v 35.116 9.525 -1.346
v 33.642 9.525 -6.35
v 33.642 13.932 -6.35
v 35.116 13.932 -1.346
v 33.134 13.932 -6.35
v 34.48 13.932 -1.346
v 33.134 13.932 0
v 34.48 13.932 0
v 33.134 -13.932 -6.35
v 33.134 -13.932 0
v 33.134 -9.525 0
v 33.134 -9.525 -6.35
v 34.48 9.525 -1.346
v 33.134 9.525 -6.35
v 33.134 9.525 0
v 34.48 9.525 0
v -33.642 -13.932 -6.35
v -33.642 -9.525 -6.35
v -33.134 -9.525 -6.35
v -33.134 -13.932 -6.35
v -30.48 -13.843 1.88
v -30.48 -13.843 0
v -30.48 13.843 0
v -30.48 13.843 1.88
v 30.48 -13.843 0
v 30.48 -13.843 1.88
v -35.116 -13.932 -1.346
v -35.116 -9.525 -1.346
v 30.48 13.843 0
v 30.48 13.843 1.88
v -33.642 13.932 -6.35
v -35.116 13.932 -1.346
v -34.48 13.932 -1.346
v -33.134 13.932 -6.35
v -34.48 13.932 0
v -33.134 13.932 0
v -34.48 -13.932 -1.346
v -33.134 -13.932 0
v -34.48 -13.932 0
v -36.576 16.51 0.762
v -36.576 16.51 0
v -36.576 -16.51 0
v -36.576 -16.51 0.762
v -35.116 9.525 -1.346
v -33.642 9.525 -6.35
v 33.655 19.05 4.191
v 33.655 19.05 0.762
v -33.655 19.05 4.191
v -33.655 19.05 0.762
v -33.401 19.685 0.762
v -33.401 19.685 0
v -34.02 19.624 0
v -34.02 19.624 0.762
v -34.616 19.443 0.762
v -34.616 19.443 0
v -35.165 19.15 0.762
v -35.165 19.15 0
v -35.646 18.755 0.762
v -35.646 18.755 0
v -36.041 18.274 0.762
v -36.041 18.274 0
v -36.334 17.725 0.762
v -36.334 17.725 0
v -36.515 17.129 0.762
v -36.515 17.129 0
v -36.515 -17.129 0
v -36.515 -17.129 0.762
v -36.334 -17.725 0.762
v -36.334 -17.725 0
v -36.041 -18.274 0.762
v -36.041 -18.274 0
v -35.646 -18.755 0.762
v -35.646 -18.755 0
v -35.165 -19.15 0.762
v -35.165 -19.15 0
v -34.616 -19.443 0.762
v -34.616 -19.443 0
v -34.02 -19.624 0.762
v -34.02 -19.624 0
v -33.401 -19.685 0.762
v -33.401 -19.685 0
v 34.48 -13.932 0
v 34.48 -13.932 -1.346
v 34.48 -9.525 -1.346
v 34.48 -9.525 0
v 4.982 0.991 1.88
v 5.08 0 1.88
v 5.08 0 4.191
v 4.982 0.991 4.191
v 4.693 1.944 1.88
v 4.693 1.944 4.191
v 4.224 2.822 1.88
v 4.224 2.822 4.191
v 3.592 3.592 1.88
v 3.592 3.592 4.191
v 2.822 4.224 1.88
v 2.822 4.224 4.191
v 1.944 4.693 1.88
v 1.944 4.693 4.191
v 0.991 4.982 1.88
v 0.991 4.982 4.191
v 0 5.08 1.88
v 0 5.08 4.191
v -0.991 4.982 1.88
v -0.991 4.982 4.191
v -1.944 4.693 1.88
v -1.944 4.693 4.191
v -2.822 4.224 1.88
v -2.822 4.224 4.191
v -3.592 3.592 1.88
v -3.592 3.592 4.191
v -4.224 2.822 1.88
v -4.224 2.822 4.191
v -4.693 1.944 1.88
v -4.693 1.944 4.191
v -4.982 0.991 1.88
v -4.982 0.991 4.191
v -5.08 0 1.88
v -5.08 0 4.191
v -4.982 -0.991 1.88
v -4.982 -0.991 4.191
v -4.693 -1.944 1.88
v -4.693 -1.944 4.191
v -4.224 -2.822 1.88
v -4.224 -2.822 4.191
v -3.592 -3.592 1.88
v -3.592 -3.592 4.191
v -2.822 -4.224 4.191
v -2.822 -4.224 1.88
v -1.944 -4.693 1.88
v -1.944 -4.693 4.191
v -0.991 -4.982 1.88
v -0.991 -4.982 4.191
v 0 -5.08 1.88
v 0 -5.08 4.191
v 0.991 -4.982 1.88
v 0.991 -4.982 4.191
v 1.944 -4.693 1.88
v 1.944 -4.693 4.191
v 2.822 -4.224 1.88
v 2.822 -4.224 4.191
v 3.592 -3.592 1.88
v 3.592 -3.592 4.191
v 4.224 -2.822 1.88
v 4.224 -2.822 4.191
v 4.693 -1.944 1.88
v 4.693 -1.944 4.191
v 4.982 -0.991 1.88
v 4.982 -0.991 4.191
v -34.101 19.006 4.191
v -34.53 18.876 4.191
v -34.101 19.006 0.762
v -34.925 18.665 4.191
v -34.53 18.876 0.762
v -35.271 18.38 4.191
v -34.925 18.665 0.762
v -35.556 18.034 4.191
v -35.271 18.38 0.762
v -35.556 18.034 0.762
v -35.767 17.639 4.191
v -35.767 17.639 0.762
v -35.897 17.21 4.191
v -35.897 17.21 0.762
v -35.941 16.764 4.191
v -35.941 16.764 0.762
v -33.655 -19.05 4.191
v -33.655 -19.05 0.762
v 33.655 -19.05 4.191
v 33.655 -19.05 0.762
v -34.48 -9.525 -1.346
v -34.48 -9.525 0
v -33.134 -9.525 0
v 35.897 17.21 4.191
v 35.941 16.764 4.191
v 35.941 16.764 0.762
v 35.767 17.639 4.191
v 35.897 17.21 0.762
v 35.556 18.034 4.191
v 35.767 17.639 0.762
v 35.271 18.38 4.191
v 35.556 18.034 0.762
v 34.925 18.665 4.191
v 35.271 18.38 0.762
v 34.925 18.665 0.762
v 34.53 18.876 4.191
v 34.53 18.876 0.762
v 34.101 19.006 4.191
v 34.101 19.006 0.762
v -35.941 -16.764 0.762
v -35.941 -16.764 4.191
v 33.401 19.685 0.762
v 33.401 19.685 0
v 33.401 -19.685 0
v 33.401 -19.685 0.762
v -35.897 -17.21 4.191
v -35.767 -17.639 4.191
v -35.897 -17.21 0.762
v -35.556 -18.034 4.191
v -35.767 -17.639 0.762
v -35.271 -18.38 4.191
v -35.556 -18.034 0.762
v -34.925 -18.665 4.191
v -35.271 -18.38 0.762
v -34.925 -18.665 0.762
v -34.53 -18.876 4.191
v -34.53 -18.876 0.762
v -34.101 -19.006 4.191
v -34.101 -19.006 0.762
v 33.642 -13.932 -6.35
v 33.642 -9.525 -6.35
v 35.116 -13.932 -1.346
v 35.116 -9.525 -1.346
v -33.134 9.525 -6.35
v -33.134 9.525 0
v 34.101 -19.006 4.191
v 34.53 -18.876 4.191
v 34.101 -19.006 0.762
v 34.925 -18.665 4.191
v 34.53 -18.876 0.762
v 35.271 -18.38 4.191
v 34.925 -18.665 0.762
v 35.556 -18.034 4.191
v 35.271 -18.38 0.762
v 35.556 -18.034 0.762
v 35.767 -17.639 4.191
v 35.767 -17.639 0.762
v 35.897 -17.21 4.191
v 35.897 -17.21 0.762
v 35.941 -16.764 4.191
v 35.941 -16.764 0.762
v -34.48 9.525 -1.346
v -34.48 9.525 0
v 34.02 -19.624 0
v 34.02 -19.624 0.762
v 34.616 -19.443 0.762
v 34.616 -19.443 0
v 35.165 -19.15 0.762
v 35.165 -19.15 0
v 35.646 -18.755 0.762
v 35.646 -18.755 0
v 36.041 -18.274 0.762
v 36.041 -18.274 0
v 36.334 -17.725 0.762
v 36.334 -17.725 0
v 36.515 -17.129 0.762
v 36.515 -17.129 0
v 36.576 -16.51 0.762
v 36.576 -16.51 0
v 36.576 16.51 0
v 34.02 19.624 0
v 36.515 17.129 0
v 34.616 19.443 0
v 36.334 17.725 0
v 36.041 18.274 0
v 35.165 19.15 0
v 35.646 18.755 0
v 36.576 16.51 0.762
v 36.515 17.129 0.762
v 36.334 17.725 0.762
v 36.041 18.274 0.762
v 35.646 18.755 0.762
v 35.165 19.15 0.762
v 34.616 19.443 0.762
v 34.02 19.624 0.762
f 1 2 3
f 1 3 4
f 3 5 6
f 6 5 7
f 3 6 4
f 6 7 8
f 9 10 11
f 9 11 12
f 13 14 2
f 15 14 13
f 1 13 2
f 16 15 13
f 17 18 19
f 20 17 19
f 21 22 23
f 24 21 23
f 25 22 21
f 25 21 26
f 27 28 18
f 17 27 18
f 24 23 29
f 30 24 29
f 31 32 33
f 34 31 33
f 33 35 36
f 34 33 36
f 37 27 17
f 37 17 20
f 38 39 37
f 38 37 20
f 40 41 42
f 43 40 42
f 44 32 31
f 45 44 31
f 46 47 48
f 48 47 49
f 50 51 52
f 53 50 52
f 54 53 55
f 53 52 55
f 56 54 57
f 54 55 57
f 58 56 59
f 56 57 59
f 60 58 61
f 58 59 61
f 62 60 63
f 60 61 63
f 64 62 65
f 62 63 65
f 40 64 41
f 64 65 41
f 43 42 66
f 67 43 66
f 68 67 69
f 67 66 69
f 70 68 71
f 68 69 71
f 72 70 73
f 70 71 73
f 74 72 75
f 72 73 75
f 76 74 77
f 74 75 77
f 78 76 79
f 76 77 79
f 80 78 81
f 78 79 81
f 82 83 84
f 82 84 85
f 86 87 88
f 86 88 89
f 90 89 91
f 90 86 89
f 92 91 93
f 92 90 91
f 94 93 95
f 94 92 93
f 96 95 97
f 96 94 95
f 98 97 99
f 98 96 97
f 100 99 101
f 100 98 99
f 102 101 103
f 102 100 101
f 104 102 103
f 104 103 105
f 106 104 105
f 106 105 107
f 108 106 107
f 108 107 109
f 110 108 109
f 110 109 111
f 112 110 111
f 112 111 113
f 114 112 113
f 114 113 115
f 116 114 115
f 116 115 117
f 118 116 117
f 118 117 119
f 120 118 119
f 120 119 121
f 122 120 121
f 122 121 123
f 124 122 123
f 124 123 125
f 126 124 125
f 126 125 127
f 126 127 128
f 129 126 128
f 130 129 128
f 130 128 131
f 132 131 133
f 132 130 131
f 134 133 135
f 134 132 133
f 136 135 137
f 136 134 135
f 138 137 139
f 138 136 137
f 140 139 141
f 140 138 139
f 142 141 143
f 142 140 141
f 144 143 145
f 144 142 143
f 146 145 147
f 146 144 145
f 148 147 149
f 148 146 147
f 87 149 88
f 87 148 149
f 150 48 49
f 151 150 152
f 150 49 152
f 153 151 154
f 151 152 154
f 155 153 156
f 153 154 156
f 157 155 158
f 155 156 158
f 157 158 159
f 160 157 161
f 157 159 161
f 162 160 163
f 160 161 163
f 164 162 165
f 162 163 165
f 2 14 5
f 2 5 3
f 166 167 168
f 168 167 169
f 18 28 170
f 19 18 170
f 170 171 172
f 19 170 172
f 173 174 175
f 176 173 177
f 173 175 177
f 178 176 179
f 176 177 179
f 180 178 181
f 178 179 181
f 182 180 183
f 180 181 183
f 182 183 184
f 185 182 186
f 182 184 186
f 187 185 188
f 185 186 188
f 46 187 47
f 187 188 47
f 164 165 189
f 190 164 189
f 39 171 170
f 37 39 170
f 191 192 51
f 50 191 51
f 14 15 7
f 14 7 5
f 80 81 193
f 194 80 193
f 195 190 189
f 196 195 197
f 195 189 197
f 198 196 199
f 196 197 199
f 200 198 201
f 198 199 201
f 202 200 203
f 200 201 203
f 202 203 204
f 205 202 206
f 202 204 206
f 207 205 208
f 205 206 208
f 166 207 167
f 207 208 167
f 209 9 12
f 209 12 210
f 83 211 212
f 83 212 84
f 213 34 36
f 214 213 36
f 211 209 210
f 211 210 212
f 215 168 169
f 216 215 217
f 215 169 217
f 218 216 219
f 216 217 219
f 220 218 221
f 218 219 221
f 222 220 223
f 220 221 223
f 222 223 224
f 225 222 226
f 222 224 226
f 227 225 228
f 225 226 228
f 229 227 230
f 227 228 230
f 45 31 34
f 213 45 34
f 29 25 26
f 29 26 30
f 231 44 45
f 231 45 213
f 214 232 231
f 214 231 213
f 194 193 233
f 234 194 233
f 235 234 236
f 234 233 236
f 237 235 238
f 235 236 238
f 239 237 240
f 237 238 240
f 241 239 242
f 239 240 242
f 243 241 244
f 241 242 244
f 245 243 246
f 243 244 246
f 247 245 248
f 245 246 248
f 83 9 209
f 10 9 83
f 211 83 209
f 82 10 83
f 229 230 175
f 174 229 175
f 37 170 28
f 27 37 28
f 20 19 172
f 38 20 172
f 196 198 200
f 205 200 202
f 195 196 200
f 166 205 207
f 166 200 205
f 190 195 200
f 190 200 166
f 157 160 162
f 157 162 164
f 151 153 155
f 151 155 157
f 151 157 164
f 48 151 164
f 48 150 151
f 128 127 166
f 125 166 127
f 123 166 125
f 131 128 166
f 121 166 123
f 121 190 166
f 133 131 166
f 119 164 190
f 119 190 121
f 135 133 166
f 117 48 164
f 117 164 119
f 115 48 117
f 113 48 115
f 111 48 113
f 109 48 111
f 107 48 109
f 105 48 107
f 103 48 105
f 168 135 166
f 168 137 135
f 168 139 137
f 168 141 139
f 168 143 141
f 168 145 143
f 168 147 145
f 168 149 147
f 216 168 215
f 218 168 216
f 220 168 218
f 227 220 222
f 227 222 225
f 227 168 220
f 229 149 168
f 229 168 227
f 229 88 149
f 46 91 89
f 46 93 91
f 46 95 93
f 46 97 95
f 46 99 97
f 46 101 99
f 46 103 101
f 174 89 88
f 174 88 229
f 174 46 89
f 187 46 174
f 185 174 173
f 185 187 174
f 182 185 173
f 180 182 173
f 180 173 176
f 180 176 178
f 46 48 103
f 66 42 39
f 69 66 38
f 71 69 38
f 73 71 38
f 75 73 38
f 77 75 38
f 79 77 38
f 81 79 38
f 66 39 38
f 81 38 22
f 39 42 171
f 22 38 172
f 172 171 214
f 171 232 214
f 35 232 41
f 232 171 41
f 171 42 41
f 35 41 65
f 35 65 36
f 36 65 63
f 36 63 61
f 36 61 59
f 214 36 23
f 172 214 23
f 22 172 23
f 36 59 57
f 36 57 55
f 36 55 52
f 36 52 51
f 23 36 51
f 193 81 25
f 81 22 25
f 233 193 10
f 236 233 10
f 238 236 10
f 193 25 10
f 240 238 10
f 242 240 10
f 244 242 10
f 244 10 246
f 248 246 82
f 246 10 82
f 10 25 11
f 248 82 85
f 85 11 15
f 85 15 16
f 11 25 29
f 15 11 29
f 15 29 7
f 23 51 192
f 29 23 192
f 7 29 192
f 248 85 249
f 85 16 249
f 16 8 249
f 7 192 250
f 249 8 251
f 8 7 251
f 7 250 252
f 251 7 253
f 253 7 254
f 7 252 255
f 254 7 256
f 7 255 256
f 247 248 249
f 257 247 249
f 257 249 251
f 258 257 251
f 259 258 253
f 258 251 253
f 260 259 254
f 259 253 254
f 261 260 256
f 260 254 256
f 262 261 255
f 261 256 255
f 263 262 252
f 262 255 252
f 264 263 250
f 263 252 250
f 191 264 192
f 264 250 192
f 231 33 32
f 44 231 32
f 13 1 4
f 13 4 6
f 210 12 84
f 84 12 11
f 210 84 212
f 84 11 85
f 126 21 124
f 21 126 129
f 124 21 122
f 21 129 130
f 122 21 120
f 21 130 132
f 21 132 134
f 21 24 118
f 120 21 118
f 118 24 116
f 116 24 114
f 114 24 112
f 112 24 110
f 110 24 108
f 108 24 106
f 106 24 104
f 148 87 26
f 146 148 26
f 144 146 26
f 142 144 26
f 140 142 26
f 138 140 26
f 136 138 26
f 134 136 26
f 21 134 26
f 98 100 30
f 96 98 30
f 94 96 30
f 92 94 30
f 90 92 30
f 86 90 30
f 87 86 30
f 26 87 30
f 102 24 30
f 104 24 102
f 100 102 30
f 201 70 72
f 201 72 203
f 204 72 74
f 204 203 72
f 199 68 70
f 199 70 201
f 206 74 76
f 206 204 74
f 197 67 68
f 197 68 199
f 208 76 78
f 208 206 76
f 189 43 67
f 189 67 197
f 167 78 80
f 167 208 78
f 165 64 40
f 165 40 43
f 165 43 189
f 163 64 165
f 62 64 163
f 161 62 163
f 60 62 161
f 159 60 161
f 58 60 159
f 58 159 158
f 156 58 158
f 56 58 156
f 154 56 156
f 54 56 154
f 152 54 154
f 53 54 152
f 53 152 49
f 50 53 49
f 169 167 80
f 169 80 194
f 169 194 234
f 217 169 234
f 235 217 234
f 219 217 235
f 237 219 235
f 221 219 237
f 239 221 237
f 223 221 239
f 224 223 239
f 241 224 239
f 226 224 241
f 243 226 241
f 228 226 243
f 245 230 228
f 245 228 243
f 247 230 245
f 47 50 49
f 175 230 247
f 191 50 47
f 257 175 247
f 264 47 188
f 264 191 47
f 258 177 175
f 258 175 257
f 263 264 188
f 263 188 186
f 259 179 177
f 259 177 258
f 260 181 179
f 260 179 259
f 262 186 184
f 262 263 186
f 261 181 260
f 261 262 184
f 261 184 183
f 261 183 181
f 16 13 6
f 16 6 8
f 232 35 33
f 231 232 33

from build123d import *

# Parameters (mm, degrees)
F0_R     = 5.08
F1_DEPTH = 0.762
F2_R     = 5.08
F3_DEPTH = 4.191
F4_W     = 60.96
F4_H     = 27.686
F5_DEPTH = 1.8796
F7_DEPTH = 13.9319
F8_DEPTH = 9.525


with BuildPart() as f1:
    # F0 (on Top) → F1 (new body)
    with BuildSketch(Plane.XY):
        with BuildLine():
            Line((33.401, 19.685), (-33.401, 19.685))
            ThreePointArc((-33.401, 19.685), (-35.646064, 18.755064), (-36.576, 16.51))
            Line((-36.576, 16.51), (-36.576, -16.51))
            ThreePointArc((-36.576, -16.51), (-35.646064, -18.755064), (-33.401, -19.685))
            Line((-33.401, -19.685), (33.401, -19.685))
            ThreePointArc((33.401, -19.685), (35.646064, -18.755064), (36.576, -16.51))
            Line((36.576, -16.51), (36.576, 16.51))
            ThreePointArc((36.576, 16.51), (35.646064, 18.755064), (33.401, 19.685))
        make_face()
        Circle(F0_R, mode=Mode.SUBTRACT)
    extrude(amount=F1_DEPTH)

    # F2 (on Top) → F3 (join)
    with BuildSketch(Plane.XY):
        with BuildLine():
            Line((33.655, 19.05), (-33.655, 19.05))
            ThreePointArc((-33.655, 19.05), (-35.271446, 18.380446), (-35.941, 16.764))
            Line((-35.941, 16.764), (-35.941, -16.764))
            ThreePointArc((-35.941, -16.764), (-35.271446, -18.380446), (-33.655, -19.05))
            Line((-33.655, -19.05), (33.655, -19.05))
            ThreePointArc((33.655, -19.05), (35.271446, -18.380446), (35.941, -16.764))
            Line((35.941, -16.764), (35.941, 16.764))
            ThreePointArc((35.941, 16.764), (35.271446, 18.380446), (33.655, 19.05))
        make_face()
        Circle(F2_R, mode=Mode.SUBTRACT)
    extrude(amount=F3_DEPTH)

    # F4 (on Top) → F5 (cut)
    with BuildSketch(Plane.XY):
        Rectangle(F4_W, F4_H)
    extrude(amount=F5_DEPTH, mode=Mode.SUBTRACT)

    # F6 (on Front) → F7 (join, symmetric)
    with BuildSketch(Plane.XZ):
        Polygon((-33.1343, 0), (-34.4805, 0), (-34.4805, -1.3462), (-35.1155, -1.3462), (-33.6423, -6.35), (-33.1343, -6.35), align=None)
        Polygon((33.1343, 0), (33.1343, -6.35), (33.6423, -6.35), (35.1155, -1.3462), (34.4805, -1.3462), (34.4805, 0), align=None)
    extrude(amount=F7_DEPTH, both=True)

    # F6 (on Front) → F8 (cut, symmetric)
    with BuildSketch(Plane.XZ):
        Polygon((-33.1343, 0), (-34.4805, 0), (-34.4805, -1.3462), (-35.1155, -1.3462), (-33.6423, -6.35), (-33.1343, -6.35), align=None)
        Polygon((33.1343, 0), (33.1343, -6.35), (33.6423, -6.35), (35.1155, -1.3462), (34.4805, -1.3462), (34.4805, 0), align=None)
    extrude(amount=F8_DEPTH, both=True, mode=Mode.SUBTRACT)


solid = f1.part
